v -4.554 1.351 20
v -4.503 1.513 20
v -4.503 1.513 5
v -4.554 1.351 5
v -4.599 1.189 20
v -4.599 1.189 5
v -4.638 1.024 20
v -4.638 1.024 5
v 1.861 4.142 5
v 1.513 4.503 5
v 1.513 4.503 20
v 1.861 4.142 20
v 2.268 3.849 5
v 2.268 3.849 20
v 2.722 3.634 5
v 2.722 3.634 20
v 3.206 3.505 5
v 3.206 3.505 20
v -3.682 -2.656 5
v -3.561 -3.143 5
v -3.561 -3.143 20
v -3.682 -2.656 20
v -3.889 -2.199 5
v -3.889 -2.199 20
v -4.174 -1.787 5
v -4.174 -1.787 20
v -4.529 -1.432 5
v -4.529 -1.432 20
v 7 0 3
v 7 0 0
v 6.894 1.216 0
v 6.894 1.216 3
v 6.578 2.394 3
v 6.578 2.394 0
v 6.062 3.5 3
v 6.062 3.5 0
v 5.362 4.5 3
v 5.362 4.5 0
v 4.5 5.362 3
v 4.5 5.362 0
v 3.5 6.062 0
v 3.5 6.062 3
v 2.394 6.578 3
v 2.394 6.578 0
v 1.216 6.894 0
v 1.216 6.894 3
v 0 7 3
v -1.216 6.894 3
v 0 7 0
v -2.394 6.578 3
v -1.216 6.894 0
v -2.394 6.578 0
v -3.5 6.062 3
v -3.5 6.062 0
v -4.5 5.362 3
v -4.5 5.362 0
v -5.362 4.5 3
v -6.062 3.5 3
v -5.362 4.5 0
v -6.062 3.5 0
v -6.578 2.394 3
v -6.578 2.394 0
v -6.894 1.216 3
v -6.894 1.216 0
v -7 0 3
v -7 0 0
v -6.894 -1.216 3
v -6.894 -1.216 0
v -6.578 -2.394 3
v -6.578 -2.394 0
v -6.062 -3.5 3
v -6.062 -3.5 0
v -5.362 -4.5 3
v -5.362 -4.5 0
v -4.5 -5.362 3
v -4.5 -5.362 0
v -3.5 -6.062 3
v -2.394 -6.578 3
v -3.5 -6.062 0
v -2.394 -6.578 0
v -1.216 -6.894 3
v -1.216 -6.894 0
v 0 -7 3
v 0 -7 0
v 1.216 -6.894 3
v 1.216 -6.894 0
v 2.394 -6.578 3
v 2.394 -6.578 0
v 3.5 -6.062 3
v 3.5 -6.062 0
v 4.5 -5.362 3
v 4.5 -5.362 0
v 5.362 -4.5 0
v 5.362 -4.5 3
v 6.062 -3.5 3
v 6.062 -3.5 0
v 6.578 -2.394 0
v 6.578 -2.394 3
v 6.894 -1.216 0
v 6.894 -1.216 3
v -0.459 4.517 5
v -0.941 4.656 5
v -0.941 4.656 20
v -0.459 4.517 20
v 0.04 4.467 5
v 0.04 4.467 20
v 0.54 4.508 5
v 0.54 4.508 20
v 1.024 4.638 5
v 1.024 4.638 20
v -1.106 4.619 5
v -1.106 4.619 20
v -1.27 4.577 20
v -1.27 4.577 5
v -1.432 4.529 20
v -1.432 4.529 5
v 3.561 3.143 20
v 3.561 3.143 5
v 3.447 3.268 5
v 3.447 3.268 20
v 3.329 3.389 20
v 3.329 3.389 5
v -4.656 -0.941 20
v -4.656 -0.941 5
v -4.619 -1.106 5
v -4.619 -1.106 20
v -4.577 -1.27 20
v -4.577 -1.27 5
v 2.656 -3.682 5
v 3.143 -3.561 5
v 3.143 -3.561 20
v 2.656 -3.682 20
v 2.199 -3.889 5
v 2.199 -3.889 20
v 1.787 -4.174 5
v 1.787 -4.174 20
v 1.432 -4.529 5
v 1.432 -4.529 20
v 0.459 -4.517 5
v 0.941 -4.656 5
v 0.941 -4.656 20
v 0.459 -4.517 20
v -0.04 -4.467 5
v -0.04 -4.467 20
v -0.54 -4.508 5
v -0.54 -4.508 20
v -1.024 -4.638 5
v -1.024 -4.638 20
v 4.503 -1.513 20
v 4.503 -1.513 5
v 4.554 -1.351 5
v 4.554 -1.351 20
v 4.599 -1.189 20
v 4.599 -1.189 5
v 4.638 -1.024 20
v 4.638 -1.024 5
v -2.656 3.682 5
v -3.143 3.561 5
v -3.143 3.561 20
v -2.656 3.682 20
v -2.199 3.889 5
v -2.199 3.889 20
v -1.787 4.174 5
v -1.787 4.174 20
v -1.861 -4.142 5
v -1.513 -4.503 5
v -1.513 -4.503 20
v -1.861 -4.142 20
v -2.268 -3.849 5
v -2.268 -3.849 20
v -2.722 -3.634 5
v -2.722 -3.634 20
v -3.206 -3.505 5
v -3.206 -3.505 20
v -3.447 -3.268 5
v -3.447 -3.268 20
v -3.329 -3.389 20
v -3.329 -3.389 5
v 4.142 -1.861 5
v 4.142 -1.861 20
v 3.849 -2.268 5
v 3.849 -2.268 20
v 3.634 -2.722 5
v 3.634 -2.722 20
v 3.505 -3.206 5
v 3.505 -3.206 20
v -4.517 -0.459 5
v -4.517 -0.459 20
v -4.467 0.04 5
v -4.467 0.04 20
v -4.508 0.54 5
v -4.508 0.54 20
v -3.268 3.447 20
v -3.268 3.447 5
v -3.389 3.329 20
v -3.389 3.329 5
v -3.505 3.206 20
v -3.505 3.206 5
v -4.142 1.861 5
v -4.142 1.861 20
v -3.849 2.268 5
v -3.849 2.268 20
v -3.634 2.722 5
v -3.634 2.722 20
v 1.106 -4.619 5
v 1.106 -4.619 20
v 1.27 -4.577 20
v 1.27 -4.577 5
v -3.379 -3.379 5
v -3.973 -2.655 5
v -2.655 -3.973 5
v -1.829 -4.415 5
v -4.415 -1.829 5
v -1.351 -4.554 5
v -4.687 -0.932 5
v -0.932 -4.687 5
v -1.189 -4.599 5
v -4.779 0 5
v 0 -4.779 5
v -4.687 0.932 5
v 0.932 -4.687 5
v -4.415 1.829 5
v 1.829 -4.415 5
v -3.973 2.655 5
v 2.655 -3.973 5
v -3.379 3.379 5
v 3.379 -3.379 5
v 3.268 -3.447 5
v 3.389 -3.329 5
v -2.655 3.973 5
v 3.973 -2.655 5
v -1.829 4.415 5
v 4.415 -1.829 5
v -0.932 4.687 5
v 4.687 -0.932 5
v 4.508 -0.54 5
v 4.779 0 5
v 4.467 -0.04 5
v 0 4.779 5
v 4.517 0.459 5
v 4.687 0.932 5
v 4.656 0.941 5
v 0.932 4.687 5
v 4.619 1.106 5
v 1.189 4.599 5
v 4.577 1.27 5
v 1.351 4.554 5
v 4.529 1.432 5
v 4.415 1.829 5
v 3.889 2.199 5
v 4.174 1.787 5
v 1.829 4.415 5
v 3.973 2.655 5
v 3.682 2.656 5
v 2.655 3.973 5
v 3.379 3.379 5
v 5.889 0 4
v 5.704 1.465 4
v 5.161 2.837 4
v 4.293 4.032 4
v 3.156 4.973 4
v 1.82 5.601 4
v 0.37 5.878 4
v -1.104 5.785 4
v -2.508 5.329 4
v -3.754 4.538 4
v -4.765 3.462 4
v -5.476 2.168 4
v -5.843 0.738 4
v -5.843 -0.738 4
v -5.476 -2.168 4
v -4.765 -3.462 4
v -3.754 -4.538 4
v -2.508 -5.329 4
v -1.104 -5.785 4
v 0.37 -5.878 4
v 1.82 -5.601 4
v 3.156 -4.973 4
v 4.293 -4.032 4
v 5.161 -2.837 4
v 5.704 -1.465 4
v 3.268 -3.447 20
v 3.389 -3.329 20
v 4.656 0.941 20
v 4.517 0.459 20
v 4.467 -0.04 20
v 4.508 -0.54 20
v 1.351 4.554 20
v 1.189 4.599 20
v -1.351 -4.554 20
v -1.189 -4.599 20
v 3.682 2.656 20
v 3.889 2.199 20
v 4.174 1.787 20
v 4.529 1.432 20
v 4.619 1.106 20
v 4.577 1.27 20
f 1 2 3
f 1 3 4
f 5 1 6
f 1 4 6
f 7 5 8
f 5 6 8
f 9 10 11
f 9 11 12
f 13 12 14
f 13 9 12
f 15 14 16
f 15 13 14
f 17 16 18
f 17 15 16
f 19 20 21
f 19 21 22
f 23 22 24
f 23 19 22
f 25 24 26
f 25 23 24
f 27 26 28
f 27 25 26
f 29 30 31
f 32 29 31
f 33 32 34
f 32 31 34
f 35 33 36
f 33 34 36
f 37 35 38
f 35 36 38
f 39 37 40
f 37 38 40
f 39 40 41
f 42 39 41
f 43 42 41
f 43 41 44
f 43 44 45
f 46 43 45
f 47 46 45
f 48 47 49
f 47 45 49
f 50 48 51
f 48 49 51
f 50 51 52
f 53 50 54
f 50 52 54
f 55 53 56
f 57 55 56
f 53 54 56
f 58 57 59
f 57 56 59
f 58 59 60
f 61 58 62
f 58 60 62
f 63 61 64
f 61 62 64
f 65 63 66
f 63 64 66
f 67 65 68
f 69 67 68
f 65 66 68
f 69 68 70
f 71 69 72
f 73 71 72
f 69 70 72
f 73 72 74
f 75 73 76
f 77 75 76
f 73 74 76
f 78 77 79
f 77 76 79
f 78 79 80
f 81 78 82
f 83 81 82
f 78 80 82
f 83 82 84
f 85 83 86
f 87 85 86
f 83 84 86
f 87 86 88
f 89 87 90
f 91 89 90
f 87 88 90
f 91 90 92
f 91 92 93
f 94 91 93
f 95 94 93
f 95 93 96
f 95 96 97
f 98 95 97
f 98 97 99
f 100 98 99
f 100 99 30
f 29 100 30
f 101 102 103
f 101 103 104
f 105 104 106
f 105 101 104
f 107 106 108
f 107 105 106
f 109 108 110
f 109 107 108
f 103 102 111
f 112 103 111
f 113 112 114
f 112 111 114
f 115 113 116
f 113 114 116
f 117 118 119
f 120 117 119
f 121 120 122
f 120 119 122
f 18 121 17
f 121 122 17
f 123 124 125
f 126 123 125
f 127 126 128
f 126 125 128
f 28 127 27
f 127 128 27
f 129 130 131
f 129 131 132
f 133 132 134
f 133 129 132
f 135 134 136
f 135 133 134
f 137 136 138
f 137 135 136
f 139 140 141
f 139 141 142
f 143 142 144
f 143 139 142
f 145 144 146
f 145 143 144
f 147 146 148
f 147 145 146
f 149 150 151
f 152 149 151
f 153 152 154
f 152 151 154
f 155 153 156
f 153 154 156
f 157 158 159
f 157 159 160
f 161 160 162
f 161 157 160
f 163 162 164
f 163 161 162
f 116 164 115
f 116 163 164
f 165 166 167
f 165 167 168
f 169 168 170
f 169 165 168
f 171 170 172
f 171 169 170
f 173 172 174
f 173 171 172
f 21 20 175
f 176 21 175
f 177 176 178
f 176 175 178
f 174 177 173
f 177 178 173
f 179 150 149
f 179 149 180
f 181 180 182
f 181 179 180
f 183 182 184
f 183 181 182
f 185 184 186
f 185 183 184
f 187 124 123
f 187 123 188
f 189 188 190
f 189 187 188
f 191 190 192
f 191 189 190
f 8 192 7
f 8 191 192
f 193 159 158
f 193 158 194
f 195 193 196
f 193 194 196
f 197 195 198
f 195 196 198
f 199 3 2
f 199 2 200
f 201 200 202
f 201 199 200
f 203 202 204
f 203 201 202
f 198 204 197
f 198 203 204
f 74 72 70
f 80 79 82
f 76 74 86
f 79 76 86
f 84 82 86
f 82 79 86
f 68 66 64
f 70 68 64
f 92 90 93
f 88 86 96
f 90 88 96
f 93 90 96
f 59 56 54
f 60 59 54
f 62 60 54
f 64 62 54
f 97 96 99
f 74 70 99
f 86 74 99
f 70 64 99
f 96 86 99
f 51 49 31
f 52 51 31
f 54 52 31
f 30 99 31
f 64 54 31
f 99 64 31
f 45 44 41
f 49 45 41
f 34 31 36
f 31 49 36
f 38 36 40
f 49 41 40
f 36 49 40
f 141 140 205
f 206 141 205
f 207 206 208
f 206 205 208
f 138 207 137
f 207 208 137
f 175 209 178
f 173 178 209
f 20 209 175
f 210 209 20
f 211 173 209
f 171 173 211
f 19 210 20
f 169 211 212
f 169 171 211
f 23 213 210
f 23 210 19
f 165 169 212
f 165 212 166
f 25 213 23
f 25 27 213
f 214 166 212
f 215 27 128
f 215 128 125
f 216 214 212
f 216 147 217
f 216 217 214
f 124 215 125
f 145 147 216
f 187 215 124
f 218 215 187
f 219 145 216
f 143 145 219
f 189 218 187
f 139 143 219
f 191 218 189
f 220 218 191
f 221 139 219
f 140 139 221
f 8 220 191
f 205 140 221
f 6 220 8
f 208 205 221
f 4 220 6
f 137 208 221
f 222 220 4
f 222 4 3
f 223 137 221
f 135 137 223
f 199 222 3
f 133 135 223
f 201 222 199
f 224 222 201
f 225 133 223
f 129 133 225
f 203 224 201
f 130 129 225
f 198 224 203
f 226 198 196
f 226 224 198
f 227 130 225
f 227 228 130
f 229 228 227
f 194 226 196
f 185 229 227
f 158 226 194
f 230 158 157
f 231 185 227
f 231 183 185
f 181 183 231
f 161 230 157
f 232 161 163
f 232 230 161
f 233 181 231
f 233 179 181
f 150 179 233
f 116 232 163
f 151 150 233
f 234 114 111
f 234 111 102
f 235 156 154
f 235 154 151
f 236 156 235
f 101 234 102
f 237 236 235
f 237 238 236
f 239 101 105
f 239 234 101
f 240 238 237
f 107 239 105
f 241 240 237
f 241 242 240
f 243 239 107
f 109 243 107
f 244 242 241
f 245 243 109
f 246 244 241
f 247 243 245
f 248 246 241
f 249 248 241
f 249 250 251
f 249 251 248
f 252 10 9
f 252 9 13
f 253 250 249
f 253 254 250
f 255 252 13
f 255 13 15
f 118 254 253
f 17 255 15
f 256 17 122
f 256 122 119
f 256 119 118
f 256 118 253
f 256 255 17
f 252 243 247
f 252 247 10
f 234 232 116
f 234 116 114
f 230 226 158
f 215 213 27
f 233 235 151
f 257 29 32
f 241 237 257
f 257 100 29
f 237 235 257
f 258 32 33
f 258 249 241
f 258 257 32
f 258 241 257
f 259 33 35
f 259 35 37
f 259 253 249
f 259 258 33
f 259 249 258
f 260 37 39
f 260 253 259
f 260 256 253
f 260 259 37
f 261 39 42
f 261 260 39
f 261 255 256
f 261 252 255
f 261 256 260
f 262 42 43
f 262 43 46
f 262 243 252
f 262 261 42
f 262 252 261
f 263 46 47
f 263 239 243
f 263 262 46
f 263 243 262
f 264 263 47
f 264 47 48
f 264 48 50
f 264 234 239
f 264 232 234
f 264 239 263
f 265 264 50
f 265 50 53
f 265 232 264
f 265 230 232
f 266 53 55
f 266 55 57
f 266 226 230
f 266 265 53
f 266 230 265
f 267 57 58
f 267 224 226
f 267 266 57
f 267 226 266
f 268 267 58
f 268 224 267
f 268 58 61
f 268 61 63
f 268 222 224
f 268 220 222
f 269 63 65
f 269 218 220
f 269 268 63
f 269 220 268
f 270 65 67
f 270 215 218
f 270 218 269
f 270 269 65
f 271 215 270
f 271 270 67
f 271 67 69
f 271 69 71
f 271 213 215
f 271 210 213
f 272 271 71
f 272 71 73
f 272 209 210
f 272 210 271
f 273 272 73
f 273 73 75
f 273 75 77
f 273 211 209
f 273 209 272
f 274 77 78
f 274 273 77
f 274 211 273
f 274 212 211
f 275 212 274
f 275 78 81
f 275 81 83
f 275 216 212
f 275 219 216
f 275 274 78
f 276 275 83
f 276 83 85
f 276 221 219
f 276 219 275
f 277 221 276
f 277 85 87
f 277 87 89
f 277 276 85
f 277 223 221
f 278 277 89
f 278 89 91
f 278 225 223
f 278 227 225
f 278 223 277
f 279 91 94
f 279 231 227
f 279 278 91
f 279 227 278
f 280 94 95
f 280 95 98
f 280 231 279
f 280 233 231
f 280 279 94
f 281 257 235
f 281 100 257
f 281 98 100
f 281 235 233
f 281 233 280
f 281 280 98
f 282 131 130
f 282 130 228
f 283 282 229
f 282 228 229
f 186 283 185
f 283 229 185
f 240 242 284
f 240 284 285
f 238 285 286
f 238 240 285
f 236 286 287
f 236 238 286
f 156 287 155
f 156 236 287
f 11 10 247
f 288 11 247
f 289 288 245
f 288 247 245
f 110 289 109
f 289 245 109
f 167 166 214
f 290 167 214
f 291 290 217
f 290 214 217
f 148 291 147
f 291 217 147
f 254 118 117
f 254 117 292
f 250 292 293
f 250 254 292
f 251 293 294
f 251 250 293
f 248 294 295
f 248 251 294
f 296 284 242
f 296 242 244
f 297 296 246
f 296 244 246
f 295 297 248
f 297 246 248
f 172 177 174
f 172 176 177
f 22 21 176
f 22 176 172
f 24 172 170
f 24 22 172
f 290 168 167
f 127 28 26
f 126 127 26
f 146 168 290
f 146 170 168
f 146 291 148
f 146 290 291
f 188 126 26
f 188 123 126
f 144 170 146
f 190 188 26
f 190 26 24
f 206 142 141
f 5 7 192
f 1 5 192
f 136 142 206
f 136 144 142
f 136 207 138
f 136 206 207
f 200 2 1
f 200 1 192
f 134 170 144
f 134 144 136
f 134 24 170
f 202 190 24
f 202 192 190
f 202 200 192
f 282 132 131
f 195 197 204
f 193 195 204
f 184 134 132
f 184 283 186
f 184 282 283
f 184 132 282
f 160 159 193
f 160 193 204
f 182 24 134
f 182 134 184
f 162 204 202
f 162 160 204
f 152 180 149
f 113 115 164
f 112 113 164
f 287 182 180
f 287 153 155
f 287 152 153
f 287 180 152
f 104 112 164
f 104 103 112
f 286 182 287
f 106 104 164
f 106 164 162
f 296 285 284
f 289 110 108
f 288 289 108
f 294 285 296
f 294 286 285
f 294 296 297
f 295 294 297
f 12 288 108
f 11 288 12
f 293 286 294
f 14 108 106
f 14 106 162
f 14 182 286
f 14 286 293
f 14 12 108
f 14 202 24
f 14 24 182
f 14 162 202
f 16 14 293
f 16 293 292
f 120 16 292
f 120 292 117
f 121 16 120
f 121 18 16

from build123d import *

# Parameters (mm, degrees)
CROQUIS1_R              = 7
SALIENTE_EXTRUIR1_DEPTH = 5
CROQUIS2_R              = 4.75
SALIENTE_EXTRUIR2_DEPTH = 15
CHAFL_N1_SIZE           = 2
CHAFL_N1_SIZE2          = 2.22122503
CORTAR_EXTRUIR1_START   = -15
CORTAR_EXTRUIR1_DEPTH   = 15
MATRIZC1_COUNT          = 12


with BuildPart() as part:
    # Croquis1 → Saliente-Extruir1 (new body)
    with BuildSketch(Plane.XY):
        Circle(CROQUIS1_R)
    extrude(amount=SALIENTE_EXTRUIR1_DEPTH)

    # Croquis2 → Saliente-Extruir2 (add)
    with BuildSketch(Plane.XY.offset(5)):
        Circle(CROQUIS2_R)
    extrude(amount=SALIENTE_EXTRUIR2_DEPTH)

    # Chaflán1
    chafl_n1_edges = [part.edges().sort_by_distance(p)[0] for p in [
        (-7, 0, 5),
    ]]
    chafl_n1_side = [part.faces().sort_by_distance(p)[0] for p in [
        (-7, 0, 2.5),
    ]]
    chamfer(chafl_n1_edges, length=CHAFL_N1_SIZE, length2=CHAFL_N1_SIZE2, reference=chafl_n1_side[0])

    # Croquis3 → Cortar-Extruir1 (cut)
    with BuildSketch(Plane.XY.offset(20).offset(CORTAR_EXTRUIR1_START)):
        with BuildLine():
            ThreePointArc((-0.941424284, 4.655772795), (0.03975399, 4.467490129), (1.024127494, 4.638282319))
            ThreePointArc((1.024127494, 4.638282319), (0.042266233, 4.749811951), (-0.941424284, 4.655772795))
        make_face()
    cortar_extruir1 = extrude(amount=CORTAR_EXTRUIR1_DEPTH, mode=Mode.SUBTRACT)

    # MatrizC1: Cortar-Extruir1 ×12 about axis
    matrizc1_axis = Axis((0, 0, 0), (0, 0, 1))
    for i in range(1, MATRIZC1_COUNT):
        add(cortar_extruir1.rotate(matrizc1_axis, i * 360 / MATRIZC1_COUNT), mode=Mode.SUBTRACT)


solid = part.part
